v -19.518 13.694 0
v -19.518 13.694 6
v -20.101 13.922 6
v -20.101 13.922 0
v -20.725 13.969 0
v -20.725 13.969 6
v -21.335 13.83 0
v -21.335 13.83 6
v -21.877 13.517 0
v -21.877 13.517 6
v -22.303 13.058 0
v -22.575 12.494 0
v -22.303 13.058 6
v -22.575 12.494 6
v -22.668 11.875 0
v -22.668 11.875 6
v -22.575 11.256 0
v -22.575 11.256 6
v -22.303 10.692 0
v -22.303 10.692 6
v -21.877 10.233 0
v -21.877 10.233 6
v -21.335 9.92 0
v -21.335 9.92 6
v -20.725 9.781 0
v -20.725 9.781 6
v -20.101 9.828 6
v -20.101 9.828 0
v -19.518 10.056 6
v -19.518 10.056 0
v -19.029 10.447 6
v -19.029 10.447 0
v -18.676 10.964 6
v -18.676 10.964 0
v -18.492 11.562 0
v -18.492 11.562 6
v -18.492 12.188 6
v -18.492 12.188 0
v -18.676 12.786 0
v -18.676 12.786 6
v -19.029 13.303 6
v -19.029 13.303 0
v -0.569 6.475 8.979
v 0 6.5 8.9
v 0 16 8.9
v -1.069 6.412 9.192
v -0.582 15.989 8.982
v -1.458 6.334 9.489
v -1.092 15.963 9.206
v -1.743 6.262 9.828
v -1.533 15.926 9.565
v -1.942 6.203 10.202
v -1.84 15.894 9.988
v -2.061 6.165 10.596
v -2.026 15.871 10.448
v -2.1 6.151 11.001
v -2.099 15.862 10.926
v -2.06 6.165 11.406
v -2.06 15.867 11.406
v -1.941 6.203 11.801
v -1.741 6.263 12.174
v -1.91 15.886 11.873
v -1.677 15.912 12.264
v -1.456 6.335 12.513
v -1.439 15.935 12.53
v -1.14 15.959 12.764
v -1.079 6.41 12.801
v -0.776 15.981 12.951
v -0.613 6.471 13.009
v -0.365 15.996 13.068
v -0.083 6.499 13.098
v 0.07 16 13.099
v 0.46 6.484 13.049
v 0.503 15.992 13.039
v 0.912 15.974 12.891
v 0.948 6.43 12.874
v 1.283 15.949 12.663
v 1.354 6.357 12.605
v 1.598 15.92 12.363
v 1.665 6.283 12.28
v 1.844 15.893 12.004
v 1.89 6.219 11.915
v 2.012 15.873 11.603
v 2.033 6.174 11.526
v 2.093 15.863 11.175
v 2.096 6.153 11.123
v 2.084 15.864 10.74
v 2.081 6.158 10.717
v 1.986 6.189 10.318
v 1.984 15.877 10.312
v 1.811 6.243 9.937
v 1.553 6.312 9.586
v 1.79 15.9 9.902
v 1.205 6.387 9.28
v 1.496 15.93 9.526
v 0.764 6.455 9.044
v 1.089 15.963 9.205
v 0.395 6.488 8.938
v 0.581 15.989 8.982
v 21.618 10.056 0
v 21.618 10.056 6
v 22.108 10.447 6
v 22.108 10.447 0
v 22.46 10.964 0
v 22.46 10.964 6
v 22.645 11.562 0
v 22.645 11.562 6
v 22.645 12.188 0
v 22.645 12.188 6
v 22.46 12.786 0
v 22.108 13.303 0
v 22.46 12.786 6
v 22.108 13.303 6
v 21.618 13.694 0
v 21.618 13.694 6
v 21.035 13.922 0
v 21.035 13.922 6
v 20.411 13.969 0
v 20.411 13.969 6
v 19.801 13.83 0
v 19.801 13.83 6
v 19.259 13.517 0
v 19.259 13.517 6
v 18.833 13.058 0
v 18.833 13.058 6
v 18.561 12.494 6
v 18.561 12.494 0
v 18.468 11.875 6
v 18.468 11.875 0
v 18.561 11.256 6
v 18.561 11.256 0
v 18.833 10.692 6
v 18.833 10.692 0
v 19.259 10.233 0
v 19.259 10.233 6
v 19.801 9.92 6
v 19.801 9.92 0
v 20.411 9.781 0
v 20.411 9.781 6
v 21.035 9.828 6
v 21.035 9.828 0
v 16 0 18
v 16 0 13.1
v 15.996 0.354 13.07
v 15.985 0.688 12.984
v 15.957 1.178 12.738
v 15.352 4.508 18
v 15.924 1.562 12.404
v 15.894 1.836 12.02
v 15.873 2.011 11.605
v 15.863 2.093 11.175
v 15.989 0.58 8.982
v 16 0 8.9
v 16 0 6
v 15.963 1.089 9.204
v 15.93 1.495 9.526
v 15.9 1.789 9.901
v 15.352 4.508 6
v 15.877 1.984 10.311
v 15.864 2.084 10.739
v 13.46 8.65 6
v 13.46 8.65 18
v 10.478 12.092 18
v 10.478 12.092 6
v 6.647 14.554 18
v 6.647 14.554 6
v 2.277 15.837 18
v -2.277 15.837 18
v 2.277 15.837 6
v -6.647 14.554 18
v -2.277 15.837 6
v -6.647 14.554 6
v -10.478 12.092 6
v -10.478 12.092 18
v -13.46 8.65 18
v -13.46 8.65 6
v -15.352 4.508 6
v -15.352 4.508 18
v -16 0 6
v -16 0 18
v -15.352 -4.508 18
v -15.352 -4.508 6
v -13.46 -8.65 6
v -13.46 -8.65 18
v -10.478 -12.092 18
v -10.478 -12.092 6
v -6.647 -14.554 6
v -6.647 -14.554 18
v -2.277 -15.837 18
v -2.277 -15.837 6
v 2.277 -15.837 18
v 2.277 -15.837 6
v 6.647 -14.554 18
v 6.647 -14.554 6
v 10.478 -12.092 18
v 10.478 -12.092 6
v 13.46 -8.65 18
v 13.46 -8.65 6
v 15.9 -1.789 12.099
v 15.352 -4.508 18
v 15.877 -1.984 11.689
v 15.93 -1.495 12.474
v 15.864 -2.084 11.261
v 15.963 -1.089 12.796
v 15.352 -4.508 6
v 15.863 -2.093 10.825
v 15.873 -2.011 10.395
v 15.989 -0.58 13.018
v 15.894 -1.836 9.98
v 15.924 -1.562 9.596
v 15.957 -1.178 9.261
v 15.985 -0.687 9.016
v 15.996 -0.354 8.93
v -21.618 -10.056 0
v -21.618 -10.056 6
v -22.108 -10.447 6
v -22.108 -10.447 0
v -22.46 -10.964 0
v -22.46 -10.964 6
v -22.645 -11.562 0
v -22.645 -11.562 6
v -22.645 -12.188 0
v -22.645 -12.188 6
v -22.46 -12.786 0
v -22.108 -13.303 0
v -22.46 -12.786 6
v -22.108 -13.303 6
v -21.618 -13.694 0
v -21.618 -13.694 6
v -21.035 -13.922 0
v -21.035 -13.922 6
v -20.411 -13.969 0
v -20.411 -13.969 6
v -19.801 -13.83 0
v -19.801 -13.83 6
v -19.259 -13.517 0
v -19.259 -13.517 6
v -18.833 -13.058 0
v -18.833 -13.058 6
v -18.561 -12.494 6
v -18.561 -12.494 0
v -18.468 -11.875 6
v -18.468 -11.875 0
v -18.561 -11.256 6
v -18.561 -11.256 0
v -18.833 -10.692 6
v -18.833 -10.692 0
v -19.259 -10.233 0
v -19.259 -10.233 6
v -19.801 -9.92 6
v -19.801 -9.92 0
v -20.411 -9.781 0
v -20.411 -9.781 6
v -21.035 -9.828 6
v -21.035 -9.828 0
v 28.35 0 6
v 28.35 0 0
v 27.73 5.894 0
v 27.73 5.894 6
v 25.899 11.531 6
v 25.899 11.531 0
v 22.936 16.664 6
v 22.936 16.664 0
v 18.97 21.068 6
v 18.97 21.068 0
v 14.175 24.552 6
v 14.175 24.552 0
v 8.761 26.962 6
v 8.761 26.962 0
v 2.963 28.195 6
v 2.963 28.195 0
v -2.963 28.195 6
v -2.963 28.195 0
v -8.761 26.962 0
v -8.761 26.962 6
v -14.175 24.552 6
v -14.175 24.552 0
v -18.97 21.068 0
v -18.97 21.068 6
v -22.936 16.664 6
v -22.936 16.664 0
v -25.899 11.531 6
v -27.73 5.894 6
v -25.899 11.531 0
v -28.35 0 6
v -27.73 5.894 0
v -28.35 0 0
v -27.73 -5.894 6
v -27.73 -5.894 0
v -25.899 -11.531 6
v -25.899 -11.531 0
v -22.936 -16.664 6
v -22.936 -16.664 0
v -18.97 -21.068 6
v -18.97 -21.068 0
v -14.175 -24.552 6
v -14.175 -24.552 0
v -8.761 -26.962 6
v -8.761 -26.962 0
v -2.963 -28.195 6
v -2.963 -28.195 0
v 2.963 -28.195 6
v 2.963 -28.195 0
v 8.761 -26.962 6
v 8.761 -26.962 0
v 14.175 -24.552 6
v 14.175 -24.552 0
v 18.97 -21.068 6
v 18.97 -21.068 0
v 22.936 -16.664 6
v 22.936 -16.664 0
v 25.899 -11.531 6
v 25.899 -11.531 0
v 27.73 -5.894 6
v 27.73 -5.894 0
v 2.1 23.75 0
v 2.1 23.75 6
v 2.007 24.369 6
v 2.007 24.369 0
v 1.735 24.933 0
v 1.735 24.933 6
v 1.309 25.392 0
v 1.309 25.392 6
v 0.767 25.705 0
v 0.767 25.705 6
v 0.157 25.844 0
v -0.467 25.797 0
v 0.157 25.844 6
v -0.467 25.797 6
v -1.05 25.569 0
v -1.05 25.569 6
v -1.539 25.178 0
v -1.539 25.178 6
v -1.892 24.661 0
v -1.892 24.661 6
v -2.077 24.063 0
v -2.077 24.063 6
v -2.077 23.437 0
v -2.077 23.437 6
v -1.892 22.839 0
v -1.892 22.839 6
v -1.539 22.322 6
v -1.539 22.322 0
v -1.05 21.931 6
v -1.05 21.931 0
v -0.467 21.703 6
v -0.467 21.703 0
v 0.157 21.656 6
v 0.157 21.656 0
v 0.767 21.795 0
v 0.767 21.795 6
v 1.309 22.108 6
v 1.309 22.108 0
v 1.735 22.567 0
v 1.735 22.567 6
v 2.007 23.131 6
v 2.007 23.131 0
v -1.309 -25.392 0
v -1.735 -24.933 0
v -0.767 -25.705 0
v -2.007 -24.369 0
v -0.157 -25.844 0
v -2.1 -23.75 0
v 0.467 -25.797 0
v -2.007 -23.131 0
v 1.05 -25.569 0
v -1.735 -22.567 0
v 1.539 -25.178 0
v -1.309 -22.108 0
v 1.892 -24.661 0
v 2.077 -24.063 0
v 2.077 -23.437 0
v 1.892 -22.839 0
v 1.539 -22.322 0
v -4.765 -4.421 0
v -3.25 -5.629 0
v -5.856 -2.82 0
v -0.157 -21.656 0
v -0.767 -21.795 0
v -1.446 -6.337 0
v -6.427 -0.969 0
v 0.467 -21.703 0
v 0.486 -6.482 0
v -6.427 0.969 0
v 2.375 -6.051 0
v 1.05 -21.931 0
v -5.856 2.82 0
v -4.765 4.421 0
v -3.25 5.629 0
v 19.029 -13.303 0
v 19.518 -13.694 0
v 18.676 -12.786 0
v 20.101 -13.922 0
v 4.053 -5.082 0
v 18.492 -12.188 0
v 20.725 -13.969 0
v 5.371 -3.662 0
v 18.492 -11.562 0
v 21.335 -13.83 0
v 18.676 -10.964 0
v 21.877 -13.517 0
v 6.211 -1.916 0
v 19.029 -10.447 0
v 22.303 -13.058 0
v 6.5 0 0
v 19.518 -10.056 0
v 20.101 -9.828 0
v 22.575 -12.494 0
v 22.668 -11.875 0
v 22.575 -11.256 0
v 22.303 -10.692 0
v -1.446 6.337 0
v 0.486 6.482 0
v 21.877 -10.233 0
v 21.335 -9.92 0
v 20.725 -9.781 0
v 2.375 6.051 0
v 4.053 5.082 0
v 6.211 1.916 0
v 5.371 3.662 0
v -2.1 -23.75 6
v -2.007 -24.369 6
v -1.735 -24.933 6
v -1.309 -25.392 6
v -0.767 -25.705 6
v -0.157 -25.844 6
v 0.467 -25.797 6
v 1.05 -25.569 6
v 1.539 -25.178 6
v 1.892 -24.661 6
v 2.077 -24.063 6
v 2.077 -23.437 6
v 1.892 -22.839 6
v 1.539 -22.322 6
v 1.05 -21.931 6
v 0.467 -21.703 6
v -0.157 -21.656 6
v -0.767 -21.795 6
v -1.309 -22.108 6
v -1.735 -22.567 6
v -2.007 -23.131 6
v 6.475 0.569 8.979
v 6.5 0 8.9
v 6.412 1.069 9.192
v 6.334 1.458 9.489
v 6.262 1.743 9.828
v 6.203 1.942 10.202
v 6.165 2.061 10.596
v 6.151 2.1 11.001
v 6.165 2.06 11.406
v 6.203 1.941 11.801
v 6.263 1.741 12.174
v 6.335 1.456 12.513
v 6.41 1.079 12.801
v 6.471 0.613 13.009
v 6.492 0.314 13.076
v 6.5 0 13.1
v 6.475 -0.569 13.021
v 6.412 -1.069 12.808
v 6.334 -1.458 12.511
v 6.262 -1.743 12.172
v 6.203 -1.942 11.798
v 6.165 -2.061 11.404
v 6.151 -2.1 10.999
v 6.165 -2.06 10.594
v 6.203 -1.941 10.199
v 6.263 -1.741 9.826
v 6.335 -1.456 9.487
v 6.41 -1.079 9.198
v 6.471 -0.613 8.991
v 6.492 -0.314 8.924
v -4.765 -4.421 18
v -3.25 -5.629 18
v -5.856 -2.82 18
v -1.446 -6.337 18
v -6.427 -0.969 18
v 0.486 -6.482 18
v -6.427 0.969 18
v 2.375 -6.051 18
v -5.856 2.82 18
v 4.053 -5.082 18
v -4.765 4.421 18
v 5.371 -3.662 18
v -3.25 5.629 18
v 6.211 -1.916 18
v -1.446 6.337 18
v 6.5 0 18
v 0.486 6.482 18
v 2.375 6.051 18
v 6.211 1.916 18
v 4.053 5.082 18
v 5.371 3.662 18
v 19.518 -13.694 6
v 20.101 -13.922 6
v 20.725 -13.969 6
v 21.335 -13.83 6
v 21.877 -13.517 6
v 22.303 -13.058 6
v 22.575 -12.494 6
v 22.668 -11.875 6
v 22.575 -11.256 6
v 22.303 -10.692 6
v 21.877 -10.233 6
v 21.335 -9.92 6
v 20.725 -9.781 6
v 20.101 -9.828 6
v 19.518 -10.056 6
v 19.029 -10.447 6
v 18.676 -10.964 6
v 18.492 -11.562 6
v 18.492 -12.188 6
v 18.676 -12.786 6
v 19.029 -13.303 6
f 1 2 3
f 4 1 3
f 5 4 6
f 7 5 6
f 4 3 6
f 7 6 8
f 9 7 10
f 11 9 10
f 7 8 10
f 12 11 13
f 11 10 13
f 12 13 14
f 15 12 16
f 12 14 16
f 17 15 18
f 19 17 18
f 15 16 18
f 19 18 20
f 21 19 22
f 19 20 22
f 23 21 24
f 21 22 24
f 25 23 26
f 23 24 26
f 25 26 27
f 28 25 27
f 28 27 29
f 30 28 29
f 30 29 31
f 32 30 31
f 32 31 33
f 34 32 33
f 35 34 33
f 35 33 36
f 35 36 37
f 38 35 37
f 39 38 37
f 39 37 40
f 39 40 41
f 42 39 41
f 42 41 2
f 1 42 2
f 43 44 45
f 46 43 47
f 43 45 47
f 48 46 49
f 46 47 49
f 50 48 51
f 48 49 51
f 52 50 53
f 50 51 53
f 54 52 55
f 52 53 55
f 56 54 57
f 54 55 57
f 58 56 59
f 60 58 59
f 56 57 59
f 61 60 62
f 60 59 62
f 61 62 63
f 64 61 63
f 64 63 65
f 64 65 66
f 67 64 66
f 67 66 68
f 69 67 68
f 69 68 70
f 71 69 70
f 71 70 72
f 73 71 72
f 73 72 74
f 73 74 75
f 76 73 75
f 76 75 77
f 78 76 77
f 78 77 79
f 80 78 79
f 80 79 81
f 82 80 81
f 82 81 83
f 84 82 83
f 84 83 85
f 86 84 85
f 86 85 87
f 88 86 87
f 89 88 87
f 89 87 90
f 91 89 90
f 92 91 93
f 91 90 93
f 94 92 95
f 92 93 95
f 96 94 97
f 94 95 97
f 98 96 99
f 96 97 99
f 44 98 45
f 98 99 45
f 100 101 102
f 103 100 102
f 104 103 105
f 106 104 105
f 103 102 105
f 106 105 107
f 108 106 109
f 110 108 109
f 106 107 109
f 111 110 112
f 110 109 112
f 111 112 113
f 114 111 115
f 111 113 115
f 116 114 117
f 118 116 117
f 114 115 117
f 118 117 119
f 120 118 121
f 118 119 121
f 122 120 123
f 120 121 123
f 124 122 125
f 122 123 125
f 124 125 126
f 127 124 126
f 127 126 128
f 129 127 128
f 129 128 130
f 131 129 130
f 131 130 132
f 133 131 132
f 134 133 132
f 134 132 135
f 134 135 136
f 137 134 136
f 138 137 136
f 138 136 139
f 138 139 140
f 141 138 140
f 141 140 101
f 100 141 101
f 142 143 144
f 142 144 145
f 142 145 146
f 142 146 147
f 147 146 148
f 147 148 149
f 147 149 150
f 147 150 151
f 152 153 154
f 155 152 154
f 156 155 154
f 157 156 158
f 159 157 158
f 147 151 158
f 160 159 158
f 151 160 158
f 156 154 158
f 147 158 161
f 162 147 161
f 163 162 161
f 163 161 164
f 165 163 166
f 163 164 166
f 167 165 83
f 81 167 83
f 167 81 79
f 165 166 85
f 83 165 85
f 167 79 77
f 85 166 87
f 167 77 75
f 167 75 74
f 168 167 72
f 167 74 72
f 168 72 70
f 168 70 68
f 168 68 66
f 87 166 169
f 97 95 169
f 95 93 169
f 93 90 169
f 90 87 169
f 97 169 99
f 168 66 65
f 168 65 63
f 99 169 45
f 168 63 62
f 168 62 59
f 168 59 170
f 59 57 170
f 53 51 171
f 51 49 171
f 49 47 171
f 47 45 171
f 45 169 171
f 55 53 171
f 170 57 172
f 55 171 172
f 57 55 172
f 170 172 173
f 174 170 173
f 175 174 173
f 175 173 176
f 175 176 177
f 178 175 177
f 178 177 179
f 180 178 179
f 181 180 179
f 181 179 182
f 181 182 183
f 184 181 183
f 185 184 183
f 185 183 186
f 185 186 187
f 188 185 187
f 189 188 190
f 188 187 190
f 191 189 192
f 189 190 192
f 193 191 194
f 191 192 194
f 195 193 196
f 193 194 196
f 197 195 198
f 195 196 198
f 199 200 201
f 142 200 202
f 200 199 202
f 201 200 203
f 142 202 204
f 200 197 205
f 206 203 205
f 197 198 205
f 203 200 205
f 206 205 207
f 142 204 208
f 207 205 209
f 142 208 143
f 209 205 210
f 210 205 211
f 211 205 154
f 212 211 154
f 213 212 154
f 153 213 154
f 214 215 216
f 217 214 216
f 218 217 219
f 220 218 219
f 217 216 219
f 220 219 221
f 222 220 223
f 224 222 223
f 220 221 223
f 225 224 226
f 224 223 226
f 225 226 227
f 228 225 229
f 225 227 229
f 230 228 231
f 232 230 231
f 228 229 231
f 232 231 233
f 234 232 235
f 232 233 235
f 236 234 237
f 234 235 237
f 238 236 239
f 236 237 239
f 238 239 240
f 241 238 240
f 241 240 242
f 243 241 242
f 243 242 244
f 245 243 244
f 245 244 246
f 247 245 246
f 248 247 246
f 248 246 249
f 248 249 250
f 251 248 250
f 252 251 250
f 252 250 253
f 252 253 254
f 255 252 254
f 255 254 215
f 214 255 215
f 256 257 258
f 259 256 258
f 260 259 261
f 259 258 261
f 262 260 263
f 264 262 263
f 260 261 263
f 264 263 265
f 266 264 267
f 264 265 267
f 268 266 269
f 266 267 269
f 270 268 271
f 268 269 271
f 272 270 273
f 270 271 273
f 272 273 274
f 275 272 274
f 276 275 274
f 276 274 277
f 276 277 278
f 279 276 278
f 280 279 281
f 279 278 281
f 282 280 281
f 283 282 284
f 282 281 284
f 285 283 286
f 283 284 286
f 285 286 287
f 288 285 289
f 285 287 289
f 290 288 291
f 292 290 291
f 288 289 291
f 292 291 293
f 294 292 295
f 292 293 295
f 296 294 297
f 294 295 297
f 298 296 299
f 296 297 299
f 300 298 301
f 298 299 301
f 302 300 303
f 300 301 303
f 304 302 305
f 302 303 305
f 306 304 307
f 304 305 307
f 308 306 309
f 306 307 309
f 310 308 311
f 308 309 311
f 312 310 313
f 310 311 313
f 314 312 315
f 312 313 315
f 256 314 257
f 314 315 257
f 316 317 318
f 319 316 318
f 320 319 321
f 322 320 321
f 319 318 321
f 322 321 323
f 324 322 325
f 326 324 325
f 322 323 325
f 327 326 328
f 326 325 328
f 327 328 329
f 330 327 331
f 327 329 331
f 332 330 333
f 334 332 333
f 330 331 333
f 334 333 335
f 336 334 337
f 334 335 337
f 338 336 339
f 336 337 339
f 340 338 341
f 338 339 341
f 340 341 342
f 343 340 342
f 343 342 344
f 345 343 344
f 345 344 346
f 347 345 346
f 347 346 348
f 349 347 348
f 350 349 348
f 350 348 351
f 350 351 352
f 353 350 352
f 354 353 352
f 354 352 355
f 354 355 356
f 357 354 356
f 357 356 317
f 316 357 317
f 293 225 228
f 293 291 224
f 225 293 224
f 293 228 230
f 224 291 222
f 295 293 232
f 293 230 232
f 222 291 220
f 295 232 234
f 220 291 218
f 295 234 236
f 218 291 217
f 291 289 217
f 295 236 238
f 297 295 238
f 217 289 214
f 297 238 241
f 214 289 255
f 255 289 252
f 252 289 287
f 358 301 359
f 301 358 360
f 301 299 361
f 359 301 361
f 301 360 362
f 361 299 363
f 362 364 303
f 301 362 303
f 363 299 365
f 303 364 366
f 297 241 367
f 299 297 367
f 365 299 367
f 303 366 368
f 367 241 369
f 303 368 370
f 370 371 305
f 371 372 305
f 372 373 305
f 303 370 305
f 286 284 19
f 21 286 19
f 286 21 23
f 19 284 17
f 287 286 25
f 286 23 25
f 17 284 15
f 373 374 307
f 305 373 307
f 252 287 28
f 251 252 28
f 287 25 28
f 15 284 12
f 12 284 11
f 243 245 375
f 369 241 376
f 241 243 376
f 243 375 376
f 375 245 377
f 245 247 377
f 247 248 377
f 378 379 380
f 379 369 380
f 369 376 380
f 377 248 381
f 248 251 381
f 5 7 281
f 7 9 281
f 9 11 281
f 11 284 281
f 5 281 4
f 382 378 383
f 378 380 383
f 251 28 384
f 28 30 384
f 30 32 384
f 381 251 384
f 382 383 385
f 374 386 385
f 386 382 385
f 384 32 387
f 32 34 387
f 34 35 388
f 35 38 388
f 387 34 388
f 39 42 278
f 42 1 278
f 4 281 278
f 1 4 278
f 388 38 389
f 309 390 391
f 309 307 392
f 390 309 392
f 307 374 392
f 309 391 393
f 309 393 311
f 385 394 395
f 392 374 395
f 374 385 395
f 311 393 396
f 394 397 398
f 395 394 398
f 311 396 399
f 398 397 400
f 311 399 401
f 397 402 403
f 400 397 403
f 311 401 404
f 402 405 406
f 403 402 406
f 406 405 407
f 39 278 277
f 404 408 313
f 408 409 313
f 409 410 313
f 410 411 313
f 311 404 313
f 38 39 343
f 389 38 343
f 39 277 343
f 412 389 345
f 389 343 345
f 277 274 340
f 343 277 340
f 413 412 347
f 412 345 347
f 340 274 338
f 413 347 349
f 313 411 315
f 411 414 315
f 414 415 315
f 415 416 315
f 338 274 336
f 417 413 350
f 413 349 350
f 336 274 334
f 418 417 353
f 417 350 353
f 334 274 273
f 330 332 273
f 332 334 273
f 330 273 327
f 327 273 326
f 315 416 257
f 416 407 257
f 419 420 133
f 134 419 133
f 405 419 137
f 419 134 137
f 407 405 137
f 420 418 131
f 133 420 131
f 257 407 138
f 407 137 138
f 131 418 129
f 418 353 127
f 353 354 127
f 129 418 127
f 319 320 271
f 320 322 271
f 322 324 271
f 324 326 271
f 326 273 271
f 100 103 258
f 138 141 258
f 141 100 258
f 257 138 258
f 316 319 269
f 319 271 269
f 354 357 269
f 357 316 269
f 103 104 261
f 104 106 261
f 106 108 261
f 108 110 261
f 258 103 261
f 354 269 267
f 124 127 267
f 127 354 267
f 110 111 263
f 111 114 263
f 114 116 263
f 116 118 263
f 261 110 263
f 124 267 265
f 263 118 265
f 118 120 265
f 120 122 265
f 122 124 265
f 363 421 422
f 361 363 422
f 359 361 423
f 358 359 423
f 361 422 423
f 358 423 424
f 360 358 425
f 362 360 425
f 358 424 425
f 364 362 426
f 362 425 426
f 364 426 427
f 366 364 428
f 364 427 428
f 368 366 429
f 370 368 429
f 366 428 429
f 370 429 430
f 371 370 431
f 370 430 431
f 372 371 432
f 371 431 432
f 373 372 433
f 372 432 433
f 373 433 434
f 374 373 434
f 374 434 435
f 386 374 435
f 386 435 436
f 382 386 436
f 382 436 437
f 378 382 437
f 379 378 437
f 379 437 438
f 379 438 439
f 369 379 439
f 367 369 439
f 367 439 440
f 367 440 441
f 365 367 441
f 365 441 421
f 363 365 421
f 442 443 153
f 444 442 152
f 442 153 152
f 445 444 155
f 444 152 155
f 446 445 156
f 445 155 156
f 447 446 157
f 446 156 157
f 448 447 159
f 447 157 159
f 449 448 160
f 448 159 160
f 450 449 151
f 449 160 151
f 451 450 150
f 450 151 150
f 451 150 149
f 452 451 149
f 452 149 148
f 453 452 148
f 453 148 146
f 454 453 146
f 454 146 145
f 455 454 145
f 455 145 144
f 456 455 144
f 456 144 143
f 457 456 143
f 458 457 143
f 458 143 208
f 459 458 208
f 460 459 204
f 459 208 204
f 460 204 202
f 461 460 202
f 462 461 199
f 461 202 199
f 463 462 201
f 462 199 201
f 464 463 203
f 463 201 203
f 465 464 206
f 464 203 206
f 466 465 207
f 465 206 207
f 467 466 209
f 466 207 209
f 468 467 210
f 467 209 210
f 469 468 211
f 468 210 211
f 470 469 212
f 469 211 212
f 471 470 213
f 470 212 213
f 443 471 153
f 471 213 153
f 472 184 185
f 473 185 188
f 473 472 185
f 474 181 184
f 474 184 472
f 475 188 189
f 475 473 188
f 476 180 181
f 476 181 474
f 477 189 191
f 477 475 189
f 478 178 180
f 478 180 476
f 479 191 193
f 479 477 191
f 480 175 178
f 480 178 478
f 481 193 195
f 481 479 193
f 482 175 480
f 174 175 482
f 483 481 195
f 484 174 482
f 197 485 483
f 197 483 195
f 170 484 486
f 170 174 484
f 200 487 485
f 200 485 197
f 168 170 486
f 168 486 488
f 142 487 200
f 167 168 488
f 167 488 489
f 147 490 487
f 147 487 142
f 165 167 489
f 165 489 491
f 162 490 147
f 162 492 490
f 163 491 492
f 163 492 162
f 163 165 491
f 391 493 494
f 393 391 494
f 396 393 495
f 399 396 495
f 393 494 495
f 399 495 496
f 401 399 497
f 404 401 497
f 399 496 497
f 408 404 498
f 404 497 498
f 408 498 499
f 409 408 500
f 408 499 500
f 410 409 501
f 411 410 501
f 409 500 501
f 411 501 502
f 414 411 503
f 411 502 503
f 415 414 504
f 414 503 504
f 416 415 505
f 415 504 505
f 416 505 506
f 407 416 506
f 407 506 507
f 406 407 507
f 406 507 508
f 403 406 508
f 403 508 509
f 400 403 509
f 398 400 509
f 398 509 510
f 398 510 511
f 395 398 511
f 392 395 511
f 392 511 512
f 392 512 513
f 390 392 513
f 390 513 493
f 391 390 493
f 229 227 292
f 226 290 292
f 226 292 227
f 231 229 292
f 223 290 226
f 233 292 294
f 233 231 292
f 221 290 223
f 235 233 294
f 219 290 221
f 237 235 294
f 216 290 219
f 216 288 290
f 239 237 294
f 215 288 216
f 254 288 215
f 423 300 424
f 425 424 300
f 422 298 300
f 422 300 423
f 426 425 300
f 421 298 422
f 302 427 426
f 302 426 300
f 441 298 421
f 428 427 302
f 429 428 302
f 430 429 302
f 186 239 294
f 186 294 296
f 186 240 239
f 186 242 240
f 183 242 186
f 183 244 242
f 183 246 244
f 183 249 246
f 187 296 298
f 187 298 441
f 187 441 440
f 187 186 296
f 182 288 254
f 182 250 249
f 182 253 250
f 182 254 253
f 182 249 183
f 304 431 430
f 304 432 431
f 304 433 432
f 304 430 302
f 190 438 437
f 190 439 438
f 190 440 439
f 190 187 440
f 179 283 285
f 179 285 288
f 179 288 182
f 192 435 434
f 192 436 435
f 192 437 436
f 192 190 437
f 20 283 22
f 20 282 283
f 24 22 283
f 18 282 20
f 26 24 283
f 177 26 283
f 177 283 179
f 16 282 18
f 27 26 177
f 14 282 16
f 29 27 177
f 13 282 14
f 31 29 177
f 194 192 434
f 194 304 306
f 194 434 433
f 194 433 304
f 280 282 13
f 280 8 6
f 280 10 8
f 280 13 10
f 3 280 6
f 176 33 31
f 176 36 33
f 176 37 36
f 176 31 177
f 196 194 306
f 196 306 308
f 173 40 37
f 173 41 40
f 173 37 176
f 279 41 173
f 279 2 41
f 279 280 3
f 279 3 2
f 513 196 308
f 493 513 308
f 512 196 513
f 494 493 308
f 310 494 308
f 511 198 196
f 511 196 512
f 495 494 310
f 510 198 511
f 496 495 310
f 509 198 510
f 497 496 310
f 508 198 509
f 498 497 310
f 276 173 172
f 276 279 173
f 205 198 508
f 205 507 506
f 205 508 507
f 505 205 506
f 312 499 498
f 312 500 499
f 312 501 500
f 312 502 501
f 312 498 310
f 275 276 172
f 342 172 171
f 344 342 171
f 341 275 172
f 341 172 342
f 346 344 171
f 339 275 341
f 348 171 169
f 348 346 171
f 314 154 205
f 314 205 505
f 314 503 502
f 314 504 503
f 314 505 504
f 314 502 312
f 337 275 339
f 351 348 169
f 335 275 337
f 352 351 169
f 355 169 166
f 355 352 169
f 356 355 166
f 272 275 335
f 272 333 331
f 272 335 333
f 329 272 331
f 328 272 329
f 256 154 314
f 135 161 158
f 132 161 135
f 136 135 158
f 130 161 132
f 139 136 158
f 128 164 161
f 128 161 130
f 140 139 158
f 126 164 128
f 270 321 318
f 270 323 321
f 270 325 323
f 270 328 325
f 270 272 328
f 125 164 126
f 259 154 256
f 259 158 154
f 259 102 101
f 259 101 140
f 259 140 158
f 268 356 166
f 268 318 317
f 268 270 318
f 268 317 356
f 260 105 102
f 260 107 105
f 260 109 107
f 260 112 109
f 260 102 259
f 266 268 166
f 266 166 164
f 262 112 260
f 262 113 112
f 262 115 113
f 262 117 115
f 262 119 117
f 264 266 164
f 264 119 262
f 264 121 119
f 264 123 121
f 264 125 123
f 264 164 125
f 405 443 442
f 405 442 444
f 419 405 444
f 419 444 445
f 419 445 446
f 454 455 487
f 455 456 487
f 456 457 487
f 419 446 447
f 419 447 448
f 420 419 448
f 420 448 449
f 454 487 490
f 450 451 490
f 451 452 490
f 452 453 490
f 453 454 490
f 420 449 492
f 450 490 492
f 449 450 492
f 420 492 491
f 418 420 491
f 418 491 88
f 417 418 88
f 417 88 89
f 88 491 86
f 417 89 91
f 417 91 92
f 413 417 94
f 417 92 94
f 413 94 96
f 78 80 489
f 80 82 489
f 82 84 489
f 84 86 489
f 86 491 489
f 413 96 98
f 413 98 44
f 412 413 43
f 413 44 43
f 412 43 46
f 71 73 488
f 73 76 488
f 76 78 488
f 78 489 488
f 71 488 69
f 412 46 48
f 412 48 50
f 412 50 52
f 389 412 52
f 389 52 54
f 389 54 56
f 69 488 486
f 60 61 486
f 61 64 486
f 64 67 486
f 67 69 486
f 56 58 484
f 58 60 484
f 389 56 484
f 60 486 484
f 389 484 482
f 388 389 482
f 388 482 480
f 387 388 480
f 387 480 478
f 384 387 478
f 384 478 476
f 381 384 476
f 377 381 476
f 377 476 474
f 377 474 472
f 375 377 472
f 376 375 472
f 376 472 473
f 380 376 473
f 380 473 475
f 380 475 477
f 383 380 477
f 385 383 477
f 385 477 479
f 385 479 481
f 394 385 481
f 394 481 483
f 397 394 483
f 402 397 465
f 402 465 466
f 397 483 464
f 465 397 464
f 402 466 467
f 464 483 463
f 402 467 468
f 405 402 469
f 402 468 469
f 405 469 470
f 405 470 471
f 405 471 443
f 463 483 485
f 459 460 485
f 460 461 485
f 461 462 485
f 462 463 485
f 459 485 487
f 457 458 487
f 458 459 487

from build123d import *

# Parameters (mm, degrees)
SKETCH_1_R               = 28.35
EXTRUDE_1_DEPTH          = 6
SKETCH_2_R               = 16
EXTRUDE_2_DEPTH          = 12
SKETCH_3_R               = 6.5
CUT_EXTRUDE_1_DEPTH      = 44.948208155
HOLE_WIZARD_M5_2_D       = 4.2
PATTERN_CIRCULAR_1_COUNT = 6
CUT_EXTRUDE_3_REACH      = 57.63
CUT_EXTRUDE_3_END_RADIUS = 6.5
SKETCH_6_R               = 2.1
PATTERN_CIRCULAR_2_COUNT = 2
PATTERN_CIRCULAR_2_ANGLE = 90


with BuildPart() as part:
    # 草圖1 → 填料-伸長1 (new body)
    with BuildSketch(Plane.XY):
        Circle(SKETCH_1_R)
    extrude(amount=EXTRUDE_1_DEPTH)

    # 草圖2 → 填料-伸長2 (add)
    with BuildSketch(Plane.XY.offset(6)):
        Circle(SKETCH_2_R)
    extrude(amount=EXTRUDE_2_DEPTH)

    # 草圖3 → 除料-伸長1 (cut, through all)
    with BuildSketch(Plane.XY.offset(18)):
        Circle(SKETCH_3_R)
    extrude(amount=-CUT_EXTRUDE_1_DEPTH, mode=Mode.SUBTRACT)

    # M5 螺紋孔2 (through all)
    with Locations(Plane(origin=(0, 0, 0), x_dir=(-1, 0, 0), z_dir=(0, 0, -1))):
        with Locations((0, 23.75)):
            hole_wizard_m5_2 = Hole(HOLE_WIZARD_M5_2_D / 2)

    # 環狀複製排列1: M5 螺紋孔2 ×6 about axis
    pattern_circular_1_axis = Axis((0, 0, 0), (0, 0, 1))
    for i in range(1, PATTERN_CIRCULAR_1_COUNT):
        add(hole_wizard_m5_2.rotate(pattern_circular_1_axis, i * 360 / PATTERN_CIRCULAR_1_COUNT), mode=Mode.SUBTRACT)

    # 除料-伸長3: up to this cylinder (the profile starts outside it)
    cut_extrude_3_end = Plane(origin=(0, 0, 11), z_dir=(0, 0, 1)) * Cylinder(CUT_EXTRUDE_3_END_RADIUS, 129.26, mode=Mode.PRIVATE)
    # 草圖6 → 除料-伸長3 (cut, up to the surface)
    with BuildSketch(Plane(origin=(16, 0, 0), x_dir=(0, 0, -1), z_dir=(1, 0, 0)), mode=Mode.PRIVATE) as cut_extrude_3_sk1:
        with Locations((-11, 0)):
            Circle(SKETCH_6_R)
    cut_extrude_3_tool1 = extrude(cut_extrude_3_sk1.sketch, amount=-CUT_EXTRUDE_3_REACH, mode=Mode.PRIVATE) - cut_extrude_3_end
    cut_extrude_3 = cut_extrude_3_tool1.solids().sort_by_distance((16, 0, 11))[0]
    add(cut_extrude_3, mode=Mode.SUBTRACT)

    # 環狀複製排列2: 除料-伸長3 ×2 about axis
    pattern_circular_2_axis = Axis((0, 0, 18), (0, 0, 1))
    for i in range(1, PATTERN_CIRCULAR_2_COUNT):
        add(cut_extrude_3.rotate(pattern_circular_2_axis, i * PATTERN_CIRCULAR_2_ANGLE / (PATTERN_CIRCULAR_2_COUNT - 1)), mode=Mode.SUBTRACT)


solid = part.part
